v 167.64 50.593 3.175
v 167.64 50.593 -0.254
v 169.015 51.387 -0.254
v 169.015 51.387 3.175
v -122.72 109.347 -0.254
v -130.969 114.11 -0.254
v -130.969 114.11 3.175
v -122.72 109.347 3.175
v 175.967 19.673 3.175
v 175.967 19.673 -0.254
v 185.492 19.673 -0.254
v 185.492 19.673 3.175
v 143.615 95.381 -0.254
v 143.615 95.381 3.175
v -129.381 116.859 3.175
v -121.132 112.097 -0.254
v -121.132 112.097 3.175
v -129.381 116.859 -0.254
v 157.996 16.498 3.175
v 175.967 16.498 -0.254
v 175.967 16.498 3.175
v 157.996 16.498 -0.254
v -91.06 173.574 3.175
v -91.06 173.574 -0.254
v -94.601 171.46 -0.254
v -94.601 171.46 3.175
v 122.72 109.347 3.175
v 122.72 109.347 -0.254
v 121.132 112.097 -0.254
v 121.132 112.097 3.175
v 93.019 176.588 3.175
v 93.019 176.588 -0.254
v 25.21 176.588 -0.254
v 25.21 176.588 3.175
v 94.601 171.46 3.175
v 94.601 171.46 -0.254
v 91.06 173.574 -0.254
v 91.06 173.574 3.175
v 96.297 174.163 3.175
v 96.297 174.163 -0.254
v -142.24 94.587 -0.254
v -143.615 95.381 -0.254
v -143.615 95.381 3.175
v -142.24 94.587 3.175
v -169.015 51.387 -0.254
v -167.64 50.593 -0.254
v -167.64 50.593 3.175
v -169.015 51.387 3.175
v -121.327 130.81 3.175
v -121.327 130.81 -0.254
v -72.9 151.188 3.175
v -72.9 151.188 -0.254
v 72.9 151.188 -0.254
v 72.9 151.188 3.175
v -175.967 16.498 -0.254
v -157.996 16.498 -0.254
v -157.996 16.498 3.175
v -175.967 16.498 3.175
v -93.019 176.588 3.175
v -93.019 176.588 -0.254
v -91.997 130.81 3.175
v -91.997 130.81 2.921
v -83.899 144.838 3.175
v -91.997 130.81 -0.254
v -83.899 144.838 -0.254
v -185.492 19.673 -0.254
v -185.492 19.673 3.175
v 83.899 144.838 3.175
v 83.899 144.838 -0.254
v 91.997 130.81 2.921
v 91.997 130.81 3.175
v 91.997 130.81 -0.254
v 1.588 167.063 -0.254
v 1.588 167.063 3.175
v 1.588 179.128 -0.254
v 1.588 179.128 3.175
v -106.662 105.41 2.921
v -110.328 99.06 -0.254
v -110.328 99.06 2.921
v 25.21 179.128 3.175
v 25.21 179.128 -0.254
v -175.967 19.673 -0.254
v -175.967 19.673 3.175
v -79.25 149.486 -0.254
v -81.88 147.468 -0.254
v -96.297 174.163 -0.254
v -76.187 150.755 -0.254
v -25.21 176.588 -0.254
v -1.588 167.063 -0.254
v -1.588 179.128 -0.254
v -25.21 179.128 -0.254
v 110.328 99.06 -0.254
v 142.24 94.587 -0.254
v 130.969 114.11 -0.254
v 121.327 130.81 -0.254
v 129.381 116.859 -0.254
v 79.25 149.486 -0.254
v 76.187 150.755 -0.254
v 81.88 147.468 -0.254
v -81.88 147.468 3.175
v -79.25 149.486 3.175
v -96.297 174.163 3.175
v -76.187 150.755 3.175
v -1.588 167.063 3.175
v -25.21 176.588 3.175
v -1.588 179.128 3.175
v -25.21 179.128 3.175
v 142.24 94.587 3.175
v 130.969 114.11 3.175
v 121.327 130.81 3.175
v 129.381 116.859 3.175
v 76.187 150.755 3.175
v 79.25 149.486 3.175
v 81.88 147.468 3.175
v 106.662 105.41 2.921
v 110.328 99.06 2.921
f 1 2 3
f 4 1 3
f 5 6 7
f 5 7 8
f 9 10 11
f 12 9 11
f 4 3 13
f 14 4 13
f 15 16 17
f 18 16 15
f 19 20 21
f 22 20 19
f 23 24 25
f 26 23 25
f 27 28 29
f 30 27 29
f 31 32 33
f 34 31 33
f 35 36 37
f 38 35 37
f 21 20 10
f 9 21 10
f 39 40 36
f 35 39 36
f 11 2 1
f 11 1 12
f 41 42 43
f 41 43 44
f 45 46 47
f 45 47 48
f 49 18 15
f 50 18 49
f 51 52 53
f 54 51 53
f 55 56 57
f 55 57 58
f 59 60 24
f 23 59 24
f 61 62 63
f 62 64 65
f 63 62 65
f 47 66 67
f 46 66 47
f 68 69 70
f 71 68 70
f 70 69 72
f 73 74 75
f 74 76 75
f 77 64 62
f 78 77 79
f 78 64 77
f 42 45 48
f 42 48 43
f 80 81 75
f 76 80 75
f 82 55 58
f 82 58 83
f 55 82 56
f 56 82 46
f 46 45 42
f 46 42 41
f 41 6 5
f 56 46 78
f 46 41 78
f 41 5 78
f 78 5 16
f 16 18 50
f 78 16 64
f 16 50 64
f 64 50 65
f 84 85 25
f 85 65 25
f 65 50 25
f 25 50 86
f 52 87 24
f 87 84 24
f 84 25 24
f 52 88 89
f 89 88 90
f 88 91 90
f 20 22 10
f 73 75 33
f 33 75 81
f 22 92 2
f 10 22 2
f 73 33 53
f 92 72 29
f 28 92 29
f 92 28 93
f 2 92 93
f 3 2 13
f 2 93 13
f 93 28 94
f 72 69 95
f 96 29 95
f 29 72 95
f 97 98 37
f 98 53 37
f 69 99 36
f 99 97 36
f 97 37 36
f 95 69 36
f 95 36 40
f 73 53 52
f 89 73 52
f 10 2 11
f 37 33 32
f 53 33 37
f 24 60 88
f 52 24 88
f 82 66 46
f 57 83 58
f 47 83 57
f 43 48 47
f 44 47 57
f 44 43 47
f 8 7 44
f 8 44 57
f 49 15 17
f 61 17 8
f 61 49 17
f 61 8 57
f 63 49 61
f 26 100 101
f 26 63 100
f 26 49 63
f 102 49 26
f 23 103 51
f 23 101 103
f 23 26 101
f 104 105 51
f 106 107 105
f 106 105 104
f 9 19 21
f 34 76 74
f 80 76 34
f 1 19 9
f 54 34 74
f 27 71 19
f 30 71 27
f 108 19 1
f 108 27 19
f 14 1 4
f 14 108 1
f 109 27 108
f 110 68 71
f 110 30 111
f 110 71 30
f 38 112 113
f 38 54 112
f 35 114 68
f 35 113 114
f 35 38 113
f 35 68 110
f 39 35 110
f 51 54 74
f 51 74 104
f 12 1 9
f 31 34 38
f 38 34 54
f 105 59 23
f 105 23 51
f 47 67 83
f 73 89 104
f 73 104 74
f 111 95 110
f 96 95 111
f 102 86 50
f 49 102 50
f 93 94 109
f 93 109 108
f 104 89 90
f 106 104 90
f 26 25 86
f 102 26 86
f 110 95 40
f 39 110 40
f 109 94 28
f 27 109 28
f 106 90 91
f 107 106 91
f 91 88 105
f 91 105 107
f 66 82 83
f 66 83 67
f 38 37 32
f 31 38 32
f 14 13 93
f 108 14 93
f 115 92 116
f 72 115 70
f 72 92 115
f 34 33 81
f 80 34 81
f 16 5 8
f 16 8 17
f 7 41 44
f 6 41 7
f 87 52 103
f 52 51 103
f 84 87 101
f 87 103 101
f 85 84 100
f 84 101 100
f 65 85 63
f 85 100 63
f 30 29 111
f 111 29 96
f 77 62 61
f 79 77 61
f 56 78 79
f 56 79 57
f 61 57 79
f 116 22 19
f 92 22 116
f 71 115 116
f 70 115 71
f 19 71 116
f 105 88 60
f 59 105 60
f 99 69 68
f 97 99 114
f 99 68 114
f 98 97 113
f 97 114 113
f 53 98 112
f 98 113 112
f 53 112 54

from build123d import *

# Parameters (mm, degrees)
BOSS_EXTRUDE1_DEPTH      = 3.175
BOSS_EXTRUDE1_DEPTH_BACK = 0.254
FILLET1_R                = 12.7
SKETCH3_W                = 50.8
SKETCH3_H                = 1.5875
BOSS_EXTRUDE2_DEPTH      = 3.429
CUT_EXTRUDE1_DEPTH       = 305.703453695
CUT_EXTRUDE2_DEPTH       = 305.703453695
CUT_EXTRUDE4_DEPTH       = 305.048068156
BOSS_EXTRUDE3_DEPTH      = 3.175
FILLET2_R                = 12.7
CUT_EXTRUDE5_REACH       = 237.529
SKETCH10_W               = 3.175
SKETCH10_H               = 9.525
SKETCH12_W               = 23.622
SKETCH12_H               = 3.175
BOSS_EXTRUDE4_DEPTH      = 2.54
SKETCH15_W               = 463.920025393
SKETCH15_H               = 26.613528777
CUT_EXTRUDE8_DEPTH       = 237.949226834
BOSS_EXTRUDE5_DEPTH      = 3.429
SKETCH17_W               = 23.622
SKETCH17_H               = 2.54
BOSS_EXTRUDE6_DEPTH      = 3.429
SKETCH18_W               = 3.175
SKETCH18_H               = 3.429
CUT_EXTRUDE9_DEPTH       = 9.525
CUT_EXTRUDE10_DEPTH      = 258.887018005
FILLET3_R                = 12.7
CUT_EXTRUDE11_DEPTH      = 258.887018005


with BuildPart() as part:
    # Sketch1 → Boss-Extrude1 (new, two sides: drawn at the far end of the back side and taken through both)
    with BuildSketch(Plane.XY.offset(-BOSS_EXTRUDE1_DEPTH_BACK)):
        Polygon((-196.85, 0), (-63.5, 230.968975189), (63.5, 230.968975189), (196.85, 0), (167.520606325, 0), (48.835303163, 205.568975189), (-48.835303163, 205.568975189), (-167.520606325, 0), align=None)
    extrude(amount=BOSS_EXTRUDE1_DEPTH + BOSS_EXTRUDE1_DEPTH_BACK)

    # Fillet1
    fillet1_edges = [part.edges().sort_by_distance(p)[0] for p in [
        (167.520606325, 0, 1.4605),
        (48.835303163, 205.568975189, 1.4605),
        (-48.835303163, 205.568975189, 1.4605),
        (-167.520606325, 0, 1.4605),
    ]]
    fillet(fillet1_edges, radius=FILLET1_R)

    # Sketch3 → Boss-Extrude2 (add)
    with BuildSketch(Plane(origin=(0, 0, -0.254), x_dir=(-1, 0, 0), z_dir=(0, 0, -1))):
        Polygon((81.638815329, 202.726625451), (80.264, 201.932875451), (105.664, 157.938784939), (107.038815329, 158.732534939), align=None)
        Polygon((143.614815329, 95.381044601), (142.24, 94.587294601), (167.64, 50.593204089), (169.014815329, 51.386954089), align=None)
        with Locations((0, 231.762725189)):
            Rectangle(SKETCH3_W, SKETCH3_H)
    boss_extrude2 = extrude(amount=-BOSS_EXTRUDE2_DEPTH)

    # Sketch5 → Cut-Extrude1 (cut, through all)
    with BuildSketch(Plane(origin=(0, 0, -0.254), x_dir=(-1, 0, 0), z_dir=(0, 0, -1))):
        Polygon((-175.966912895, 19.672783942), (-185.491912895, 19.672783942), (-187.325, 16.497783942), (-186.309, 16.497783942), (-175.966912895, 16.497783942), align=None)
        Polygon((-186.309, 16.497783942), (-187.325, 16.497783942), (-196.85, 0), (-195.834, 0), align=None)
        Polygon((-121.132358029, 112.096802923), (-129.38125, 116.859302923), (-130.96875, 114.109672266), (-122.719858029, 109.347172266), align=None)
    cut_extrude1 = extrude(amount=-CUT_EXTRUDE1_DEPTH, mode=Mode.SUBTRACT)

    # Sketch4 → Cut-Extrude2 (cut, through all)
    with BuildSketch(Plane(origin=(0, 0, -0.254), x_dir=(-1, 0, 0), z_dir=(0, 0, -1))):
        Polygon((-61.666912895, 230.968975189), (-56.904412895, 222.720083218), (-59.654043552, 221.132583218), (-64.416543552, 229.381475189), (-63.5, 230.968975189), align=None)
    cut_extrude2 = extrude(amount=-CUT_EXTRUDE2_DEPTH, mode=Mode.SUBTRACT)

    # Mirror1: Boss-Extrude2, Cut-Extrude1, Cut-Extrude2 across plane
    add(boss_extrude2.mirror(Plane(origin=(0, 0, 0), x_dir=(0, 0, 1), z_dir=(1, 0, 0))))
    add(cut_extrude1.mirror(Plane(origin=(0, 0, 0), x_dir=(0, 0, 1), z_dir=(1, 0, 0))), mode=Mode.SUBTRACT)
    add(cut_extrude2.mirror(Plane(origin=(0, 0, 0), x_dir=(0, 0, 1), z_dir=(1, 0, 0))), mode=Mode.SUBTRACT)

    # Sketch6 → Cut-Extrude4 (cut, through all)
    with BuildSketch(Plane(origin=(0, 0, -0.254), x_dir=(-1, 0, 0), z_dir=(0, 0, -1))):
        Polygon((-121.326811287, 130.81), (-91.997417612, 130.81), (-52.501477372, 199.218975189), (-41.502954744, 205.568975189), (41.502954744, 205.568975189), (47.852954744, 203.867497817), (52.501477372, 199.218975189), (91.997417612, 130.81), (121.326811287, 130.81), (105.664, 157.938784939), (107.038815329, 158.732534939), (81.638815329, 202.726625451), (80.264, 201.932875451), (64.416543552, 229.381475189), (59.654043552, 221.132583218), (56.904412895, 222.720083218), (61.666912895, 230.968975189), (25.4, 230.968975189), (25.4, 232.556475189), (-25.4, 232.556475189), (-25.4, 230.968975189), (-61.666912895, 230.968975189), (-56.904412895, 222.720083218), (-59.654043552, 221.132583218), (-64.416543552, 229.381475189), (-80.264, 201.932875451), (-81.638815329, 202.726625451), (-107.038815329, 158.732534939), (-105.664, 157.938784939), align=None)
    extrude(amount=-CUT_EXTRUDE4_DEPTH, mode=Mode.SUBTRACT)


with BuildPart() as cut_extrude4_piece_1:
    # of the separate pieces the step leaves, piece 1, a body of its own (cut_extrude4_pieces)
    add(part.part.solids().sort_by_distance((-174.852954744, 0, -0.254))[0])



with BuildPart() as cut_extrude4_piece_2:
    # of the separate pieces the step leaves, piece 2, a body of its own (cut_extrude4_pieces)
    add(part.part.solids().sort_by_distance((195.834, 0, -0.254))[0])


with BuildPart() as cut_extrude4_piece_1_1:
    add(cut_extrude4_piece_1.part)

    add(cut_extrude4_piece_2.part)  # Boss-Extrude3 merges Cut-Extrude4 piece 2
    # Sketch9 → Boss-Extrude3 (add)
    with BuildSketch(Plane(origin=(0, 0, -0.254), x_dir=(-1, 0, 0), z_dir=(0, 0, -1))):
        Polygon((-91.997417612, 130.81), (-106.66211445, 105.41), (106.66211445, 105.41), (91.997417612, 130.81), align=None)
    extrude(amount=-BOSS_EXTRUDE3_DEPTH)

    # Fillet2
    fillet2_edges = [cut_extrude4_piece_1_1.edges().sort_by_distance(p)[0] for p in [
        (-106.66211445, 105.41, 1.3335),
        (106.66211445, 105.41, 1.3335),
    ]]
    fillet(fillet2_edges, radius=FILLET2_R)

    # Sketch10 → Cut-Extrude5 (cut, up to next)
    with BuildSketch(Plane(origin=(0, 0, -0.254), x_dir=(-1, 0, 0), z_dir=(0, 0, -1)), mode=Mode.PRIVATE) as cut_extrude5_sk1:
        with Locations((0, 126.0475)):
            Rectangle(SKETCH10_W, SKETCH10_H)
    cut_extrude5_tool1 = extrude(cut_extrude5_sk1.sketch, amount=-CUT_EXTRUDE5_REACH, mode=Mode.PRIVATE) & cut_extrude4_piece_1_1.part
    add(cut_extrude5_tool1.solids().sort_by_distance((0, 126.0475, -0.254))[0], mode=Mode.SUBTRACT)

    # Sketch12 → Boss-Extrude4 (add)
    with BuildSketch(Plane(origin=(0, 130.81, 0), x_dir=(1, 0, 0), z_dir=(0, 1, 0))):
        with Locations((13.3985, -1.3335)):
            Rectangle(SKETCH12_W, SKETCH12_H)
        with Locations((-13.3985, -1.3335)):
            Rectangle(SKETCH12_W, SKETCH12_H)
    extrude(amount=BOSS_EXTRUDE4_DEPTH)

    # Sketch15 → Cut-Extrude8 (cut, through all)
    with BuildSketch(Plane(origin=(0, 0, -0.254), x_dir=(-1, 0, 0), z_dir=(0, 0, -1))):
        with Locations((4.62960925, 3.191019554)):
            Rectangle(SKETCH15_W, SKETCH15_H)
    extrude(amount=-CUT_EXTRUDE8_DEPTH, mode=Mode.SUBTRACT)

    # Sketch16 → Boss-Extrude5 (add)
    with BuildSketch(Plane(origin=(0, 0, -0.254), x_dir=(-1, 0, 0), z_dir=(0, 0, -1))):
        Polygon((-121.326811287, 130.81), (-94.897086805, 176.587625634), (94.897086805, 176.587625634), (121.326811287, 130.81), (91.997417612, 130.81), (80.232389968, 151.187625634), (-80.232389968, 151.187625634), (-91.997417612, 130.81), align=None)
    extrude(amount=-BOSS_EXTRUDE5_DEPTH)

    # Sketch17 → Boss-Extrude6 (add)
    with BuildSketch(Plane(origin=(0, 0, -0.254), x_dir=(-1, 0, 0), z_dir=(0, 0, -1))):
        with Locations((-13.3985, 177.857625634)):
            Rectangle(SKETCH17_W, SKETCH17_H)
        with Locations((13.3985, 177.857625634)):
            Rectangle(SKETCH17_W, SKETCH17_H)
    extrude(amount=-BOSS_EXTRUDE6_DEPTH)

    # Sketch18 → Cut-Extrude9 (cut)
    with BuildSketch(Plane(origin=(0, 176.587625634, 0), x_dir=(1, 0, 0), z_dir=(0, 1, 0))):
        with Locations((0, -1.4605)):
            Rectangle(SKETCH18_W, SKETCH18_H)
    extrude(amount=-CUT_EXTRUDE9_DEPTH, mode=Mode.SUBTRACT)

    # Sketch19 → Cut-Extrude10 (cut, through all)
    with BuildSketch(Plane(origin=(0, 0, -0.254), x_dir=(-1, 0, 0), z_dir=(0, 0, -1))):
        Polygon((-134.161947492, 57.778891971), (-86.11490379, 140.998812817), (86.11490379, 140.998812817), (134.161947492, 57.778891971), align=None)
    extrude(amount=-CUT_EXTRUDE10_DEPTH, mode=Mode.SUBTRACT)

    # Fillet3
    fillet3_edges = [cut_extrude4_piece_1_1.edges().sort_by_distance(p)[0] for p in [
        (-80.232389968, 151.187625634, 1.4605),
        (80.232389968, 151.187625634, 1.4605),
    ]]
    fillet(fillet3_edges, radius=FILLET3_R)

    # Sketch20 → Cut-Extrude11 (cut, through all)
    with BuildSketch(Plane(origin=(0, 0, -0.254), x_dir=(-1, 0, 0), z_dir=(0, 0, -1))):
        Polygon((93.018969857, 176.587625634), (91.060249362, 173.574435836), (94.601370403, 171.459929994), (96.297026346, 174.162859221), (94.897086805, 176.587625634), align=None)
        Polygon((-94.897086805, 176.587625634), (-96.297026346, 174.162859221), (-94.601370403, 171.459929994), (-91.060249362, 173.574435836), (-93.018969857, 176.587625634), align=None)
    extrude(amount=-CUT_EXTRUDE11_DEPTH, mode=Mode.SUBTRACT)


solid = cut_extrude4_piece_1_1.part
